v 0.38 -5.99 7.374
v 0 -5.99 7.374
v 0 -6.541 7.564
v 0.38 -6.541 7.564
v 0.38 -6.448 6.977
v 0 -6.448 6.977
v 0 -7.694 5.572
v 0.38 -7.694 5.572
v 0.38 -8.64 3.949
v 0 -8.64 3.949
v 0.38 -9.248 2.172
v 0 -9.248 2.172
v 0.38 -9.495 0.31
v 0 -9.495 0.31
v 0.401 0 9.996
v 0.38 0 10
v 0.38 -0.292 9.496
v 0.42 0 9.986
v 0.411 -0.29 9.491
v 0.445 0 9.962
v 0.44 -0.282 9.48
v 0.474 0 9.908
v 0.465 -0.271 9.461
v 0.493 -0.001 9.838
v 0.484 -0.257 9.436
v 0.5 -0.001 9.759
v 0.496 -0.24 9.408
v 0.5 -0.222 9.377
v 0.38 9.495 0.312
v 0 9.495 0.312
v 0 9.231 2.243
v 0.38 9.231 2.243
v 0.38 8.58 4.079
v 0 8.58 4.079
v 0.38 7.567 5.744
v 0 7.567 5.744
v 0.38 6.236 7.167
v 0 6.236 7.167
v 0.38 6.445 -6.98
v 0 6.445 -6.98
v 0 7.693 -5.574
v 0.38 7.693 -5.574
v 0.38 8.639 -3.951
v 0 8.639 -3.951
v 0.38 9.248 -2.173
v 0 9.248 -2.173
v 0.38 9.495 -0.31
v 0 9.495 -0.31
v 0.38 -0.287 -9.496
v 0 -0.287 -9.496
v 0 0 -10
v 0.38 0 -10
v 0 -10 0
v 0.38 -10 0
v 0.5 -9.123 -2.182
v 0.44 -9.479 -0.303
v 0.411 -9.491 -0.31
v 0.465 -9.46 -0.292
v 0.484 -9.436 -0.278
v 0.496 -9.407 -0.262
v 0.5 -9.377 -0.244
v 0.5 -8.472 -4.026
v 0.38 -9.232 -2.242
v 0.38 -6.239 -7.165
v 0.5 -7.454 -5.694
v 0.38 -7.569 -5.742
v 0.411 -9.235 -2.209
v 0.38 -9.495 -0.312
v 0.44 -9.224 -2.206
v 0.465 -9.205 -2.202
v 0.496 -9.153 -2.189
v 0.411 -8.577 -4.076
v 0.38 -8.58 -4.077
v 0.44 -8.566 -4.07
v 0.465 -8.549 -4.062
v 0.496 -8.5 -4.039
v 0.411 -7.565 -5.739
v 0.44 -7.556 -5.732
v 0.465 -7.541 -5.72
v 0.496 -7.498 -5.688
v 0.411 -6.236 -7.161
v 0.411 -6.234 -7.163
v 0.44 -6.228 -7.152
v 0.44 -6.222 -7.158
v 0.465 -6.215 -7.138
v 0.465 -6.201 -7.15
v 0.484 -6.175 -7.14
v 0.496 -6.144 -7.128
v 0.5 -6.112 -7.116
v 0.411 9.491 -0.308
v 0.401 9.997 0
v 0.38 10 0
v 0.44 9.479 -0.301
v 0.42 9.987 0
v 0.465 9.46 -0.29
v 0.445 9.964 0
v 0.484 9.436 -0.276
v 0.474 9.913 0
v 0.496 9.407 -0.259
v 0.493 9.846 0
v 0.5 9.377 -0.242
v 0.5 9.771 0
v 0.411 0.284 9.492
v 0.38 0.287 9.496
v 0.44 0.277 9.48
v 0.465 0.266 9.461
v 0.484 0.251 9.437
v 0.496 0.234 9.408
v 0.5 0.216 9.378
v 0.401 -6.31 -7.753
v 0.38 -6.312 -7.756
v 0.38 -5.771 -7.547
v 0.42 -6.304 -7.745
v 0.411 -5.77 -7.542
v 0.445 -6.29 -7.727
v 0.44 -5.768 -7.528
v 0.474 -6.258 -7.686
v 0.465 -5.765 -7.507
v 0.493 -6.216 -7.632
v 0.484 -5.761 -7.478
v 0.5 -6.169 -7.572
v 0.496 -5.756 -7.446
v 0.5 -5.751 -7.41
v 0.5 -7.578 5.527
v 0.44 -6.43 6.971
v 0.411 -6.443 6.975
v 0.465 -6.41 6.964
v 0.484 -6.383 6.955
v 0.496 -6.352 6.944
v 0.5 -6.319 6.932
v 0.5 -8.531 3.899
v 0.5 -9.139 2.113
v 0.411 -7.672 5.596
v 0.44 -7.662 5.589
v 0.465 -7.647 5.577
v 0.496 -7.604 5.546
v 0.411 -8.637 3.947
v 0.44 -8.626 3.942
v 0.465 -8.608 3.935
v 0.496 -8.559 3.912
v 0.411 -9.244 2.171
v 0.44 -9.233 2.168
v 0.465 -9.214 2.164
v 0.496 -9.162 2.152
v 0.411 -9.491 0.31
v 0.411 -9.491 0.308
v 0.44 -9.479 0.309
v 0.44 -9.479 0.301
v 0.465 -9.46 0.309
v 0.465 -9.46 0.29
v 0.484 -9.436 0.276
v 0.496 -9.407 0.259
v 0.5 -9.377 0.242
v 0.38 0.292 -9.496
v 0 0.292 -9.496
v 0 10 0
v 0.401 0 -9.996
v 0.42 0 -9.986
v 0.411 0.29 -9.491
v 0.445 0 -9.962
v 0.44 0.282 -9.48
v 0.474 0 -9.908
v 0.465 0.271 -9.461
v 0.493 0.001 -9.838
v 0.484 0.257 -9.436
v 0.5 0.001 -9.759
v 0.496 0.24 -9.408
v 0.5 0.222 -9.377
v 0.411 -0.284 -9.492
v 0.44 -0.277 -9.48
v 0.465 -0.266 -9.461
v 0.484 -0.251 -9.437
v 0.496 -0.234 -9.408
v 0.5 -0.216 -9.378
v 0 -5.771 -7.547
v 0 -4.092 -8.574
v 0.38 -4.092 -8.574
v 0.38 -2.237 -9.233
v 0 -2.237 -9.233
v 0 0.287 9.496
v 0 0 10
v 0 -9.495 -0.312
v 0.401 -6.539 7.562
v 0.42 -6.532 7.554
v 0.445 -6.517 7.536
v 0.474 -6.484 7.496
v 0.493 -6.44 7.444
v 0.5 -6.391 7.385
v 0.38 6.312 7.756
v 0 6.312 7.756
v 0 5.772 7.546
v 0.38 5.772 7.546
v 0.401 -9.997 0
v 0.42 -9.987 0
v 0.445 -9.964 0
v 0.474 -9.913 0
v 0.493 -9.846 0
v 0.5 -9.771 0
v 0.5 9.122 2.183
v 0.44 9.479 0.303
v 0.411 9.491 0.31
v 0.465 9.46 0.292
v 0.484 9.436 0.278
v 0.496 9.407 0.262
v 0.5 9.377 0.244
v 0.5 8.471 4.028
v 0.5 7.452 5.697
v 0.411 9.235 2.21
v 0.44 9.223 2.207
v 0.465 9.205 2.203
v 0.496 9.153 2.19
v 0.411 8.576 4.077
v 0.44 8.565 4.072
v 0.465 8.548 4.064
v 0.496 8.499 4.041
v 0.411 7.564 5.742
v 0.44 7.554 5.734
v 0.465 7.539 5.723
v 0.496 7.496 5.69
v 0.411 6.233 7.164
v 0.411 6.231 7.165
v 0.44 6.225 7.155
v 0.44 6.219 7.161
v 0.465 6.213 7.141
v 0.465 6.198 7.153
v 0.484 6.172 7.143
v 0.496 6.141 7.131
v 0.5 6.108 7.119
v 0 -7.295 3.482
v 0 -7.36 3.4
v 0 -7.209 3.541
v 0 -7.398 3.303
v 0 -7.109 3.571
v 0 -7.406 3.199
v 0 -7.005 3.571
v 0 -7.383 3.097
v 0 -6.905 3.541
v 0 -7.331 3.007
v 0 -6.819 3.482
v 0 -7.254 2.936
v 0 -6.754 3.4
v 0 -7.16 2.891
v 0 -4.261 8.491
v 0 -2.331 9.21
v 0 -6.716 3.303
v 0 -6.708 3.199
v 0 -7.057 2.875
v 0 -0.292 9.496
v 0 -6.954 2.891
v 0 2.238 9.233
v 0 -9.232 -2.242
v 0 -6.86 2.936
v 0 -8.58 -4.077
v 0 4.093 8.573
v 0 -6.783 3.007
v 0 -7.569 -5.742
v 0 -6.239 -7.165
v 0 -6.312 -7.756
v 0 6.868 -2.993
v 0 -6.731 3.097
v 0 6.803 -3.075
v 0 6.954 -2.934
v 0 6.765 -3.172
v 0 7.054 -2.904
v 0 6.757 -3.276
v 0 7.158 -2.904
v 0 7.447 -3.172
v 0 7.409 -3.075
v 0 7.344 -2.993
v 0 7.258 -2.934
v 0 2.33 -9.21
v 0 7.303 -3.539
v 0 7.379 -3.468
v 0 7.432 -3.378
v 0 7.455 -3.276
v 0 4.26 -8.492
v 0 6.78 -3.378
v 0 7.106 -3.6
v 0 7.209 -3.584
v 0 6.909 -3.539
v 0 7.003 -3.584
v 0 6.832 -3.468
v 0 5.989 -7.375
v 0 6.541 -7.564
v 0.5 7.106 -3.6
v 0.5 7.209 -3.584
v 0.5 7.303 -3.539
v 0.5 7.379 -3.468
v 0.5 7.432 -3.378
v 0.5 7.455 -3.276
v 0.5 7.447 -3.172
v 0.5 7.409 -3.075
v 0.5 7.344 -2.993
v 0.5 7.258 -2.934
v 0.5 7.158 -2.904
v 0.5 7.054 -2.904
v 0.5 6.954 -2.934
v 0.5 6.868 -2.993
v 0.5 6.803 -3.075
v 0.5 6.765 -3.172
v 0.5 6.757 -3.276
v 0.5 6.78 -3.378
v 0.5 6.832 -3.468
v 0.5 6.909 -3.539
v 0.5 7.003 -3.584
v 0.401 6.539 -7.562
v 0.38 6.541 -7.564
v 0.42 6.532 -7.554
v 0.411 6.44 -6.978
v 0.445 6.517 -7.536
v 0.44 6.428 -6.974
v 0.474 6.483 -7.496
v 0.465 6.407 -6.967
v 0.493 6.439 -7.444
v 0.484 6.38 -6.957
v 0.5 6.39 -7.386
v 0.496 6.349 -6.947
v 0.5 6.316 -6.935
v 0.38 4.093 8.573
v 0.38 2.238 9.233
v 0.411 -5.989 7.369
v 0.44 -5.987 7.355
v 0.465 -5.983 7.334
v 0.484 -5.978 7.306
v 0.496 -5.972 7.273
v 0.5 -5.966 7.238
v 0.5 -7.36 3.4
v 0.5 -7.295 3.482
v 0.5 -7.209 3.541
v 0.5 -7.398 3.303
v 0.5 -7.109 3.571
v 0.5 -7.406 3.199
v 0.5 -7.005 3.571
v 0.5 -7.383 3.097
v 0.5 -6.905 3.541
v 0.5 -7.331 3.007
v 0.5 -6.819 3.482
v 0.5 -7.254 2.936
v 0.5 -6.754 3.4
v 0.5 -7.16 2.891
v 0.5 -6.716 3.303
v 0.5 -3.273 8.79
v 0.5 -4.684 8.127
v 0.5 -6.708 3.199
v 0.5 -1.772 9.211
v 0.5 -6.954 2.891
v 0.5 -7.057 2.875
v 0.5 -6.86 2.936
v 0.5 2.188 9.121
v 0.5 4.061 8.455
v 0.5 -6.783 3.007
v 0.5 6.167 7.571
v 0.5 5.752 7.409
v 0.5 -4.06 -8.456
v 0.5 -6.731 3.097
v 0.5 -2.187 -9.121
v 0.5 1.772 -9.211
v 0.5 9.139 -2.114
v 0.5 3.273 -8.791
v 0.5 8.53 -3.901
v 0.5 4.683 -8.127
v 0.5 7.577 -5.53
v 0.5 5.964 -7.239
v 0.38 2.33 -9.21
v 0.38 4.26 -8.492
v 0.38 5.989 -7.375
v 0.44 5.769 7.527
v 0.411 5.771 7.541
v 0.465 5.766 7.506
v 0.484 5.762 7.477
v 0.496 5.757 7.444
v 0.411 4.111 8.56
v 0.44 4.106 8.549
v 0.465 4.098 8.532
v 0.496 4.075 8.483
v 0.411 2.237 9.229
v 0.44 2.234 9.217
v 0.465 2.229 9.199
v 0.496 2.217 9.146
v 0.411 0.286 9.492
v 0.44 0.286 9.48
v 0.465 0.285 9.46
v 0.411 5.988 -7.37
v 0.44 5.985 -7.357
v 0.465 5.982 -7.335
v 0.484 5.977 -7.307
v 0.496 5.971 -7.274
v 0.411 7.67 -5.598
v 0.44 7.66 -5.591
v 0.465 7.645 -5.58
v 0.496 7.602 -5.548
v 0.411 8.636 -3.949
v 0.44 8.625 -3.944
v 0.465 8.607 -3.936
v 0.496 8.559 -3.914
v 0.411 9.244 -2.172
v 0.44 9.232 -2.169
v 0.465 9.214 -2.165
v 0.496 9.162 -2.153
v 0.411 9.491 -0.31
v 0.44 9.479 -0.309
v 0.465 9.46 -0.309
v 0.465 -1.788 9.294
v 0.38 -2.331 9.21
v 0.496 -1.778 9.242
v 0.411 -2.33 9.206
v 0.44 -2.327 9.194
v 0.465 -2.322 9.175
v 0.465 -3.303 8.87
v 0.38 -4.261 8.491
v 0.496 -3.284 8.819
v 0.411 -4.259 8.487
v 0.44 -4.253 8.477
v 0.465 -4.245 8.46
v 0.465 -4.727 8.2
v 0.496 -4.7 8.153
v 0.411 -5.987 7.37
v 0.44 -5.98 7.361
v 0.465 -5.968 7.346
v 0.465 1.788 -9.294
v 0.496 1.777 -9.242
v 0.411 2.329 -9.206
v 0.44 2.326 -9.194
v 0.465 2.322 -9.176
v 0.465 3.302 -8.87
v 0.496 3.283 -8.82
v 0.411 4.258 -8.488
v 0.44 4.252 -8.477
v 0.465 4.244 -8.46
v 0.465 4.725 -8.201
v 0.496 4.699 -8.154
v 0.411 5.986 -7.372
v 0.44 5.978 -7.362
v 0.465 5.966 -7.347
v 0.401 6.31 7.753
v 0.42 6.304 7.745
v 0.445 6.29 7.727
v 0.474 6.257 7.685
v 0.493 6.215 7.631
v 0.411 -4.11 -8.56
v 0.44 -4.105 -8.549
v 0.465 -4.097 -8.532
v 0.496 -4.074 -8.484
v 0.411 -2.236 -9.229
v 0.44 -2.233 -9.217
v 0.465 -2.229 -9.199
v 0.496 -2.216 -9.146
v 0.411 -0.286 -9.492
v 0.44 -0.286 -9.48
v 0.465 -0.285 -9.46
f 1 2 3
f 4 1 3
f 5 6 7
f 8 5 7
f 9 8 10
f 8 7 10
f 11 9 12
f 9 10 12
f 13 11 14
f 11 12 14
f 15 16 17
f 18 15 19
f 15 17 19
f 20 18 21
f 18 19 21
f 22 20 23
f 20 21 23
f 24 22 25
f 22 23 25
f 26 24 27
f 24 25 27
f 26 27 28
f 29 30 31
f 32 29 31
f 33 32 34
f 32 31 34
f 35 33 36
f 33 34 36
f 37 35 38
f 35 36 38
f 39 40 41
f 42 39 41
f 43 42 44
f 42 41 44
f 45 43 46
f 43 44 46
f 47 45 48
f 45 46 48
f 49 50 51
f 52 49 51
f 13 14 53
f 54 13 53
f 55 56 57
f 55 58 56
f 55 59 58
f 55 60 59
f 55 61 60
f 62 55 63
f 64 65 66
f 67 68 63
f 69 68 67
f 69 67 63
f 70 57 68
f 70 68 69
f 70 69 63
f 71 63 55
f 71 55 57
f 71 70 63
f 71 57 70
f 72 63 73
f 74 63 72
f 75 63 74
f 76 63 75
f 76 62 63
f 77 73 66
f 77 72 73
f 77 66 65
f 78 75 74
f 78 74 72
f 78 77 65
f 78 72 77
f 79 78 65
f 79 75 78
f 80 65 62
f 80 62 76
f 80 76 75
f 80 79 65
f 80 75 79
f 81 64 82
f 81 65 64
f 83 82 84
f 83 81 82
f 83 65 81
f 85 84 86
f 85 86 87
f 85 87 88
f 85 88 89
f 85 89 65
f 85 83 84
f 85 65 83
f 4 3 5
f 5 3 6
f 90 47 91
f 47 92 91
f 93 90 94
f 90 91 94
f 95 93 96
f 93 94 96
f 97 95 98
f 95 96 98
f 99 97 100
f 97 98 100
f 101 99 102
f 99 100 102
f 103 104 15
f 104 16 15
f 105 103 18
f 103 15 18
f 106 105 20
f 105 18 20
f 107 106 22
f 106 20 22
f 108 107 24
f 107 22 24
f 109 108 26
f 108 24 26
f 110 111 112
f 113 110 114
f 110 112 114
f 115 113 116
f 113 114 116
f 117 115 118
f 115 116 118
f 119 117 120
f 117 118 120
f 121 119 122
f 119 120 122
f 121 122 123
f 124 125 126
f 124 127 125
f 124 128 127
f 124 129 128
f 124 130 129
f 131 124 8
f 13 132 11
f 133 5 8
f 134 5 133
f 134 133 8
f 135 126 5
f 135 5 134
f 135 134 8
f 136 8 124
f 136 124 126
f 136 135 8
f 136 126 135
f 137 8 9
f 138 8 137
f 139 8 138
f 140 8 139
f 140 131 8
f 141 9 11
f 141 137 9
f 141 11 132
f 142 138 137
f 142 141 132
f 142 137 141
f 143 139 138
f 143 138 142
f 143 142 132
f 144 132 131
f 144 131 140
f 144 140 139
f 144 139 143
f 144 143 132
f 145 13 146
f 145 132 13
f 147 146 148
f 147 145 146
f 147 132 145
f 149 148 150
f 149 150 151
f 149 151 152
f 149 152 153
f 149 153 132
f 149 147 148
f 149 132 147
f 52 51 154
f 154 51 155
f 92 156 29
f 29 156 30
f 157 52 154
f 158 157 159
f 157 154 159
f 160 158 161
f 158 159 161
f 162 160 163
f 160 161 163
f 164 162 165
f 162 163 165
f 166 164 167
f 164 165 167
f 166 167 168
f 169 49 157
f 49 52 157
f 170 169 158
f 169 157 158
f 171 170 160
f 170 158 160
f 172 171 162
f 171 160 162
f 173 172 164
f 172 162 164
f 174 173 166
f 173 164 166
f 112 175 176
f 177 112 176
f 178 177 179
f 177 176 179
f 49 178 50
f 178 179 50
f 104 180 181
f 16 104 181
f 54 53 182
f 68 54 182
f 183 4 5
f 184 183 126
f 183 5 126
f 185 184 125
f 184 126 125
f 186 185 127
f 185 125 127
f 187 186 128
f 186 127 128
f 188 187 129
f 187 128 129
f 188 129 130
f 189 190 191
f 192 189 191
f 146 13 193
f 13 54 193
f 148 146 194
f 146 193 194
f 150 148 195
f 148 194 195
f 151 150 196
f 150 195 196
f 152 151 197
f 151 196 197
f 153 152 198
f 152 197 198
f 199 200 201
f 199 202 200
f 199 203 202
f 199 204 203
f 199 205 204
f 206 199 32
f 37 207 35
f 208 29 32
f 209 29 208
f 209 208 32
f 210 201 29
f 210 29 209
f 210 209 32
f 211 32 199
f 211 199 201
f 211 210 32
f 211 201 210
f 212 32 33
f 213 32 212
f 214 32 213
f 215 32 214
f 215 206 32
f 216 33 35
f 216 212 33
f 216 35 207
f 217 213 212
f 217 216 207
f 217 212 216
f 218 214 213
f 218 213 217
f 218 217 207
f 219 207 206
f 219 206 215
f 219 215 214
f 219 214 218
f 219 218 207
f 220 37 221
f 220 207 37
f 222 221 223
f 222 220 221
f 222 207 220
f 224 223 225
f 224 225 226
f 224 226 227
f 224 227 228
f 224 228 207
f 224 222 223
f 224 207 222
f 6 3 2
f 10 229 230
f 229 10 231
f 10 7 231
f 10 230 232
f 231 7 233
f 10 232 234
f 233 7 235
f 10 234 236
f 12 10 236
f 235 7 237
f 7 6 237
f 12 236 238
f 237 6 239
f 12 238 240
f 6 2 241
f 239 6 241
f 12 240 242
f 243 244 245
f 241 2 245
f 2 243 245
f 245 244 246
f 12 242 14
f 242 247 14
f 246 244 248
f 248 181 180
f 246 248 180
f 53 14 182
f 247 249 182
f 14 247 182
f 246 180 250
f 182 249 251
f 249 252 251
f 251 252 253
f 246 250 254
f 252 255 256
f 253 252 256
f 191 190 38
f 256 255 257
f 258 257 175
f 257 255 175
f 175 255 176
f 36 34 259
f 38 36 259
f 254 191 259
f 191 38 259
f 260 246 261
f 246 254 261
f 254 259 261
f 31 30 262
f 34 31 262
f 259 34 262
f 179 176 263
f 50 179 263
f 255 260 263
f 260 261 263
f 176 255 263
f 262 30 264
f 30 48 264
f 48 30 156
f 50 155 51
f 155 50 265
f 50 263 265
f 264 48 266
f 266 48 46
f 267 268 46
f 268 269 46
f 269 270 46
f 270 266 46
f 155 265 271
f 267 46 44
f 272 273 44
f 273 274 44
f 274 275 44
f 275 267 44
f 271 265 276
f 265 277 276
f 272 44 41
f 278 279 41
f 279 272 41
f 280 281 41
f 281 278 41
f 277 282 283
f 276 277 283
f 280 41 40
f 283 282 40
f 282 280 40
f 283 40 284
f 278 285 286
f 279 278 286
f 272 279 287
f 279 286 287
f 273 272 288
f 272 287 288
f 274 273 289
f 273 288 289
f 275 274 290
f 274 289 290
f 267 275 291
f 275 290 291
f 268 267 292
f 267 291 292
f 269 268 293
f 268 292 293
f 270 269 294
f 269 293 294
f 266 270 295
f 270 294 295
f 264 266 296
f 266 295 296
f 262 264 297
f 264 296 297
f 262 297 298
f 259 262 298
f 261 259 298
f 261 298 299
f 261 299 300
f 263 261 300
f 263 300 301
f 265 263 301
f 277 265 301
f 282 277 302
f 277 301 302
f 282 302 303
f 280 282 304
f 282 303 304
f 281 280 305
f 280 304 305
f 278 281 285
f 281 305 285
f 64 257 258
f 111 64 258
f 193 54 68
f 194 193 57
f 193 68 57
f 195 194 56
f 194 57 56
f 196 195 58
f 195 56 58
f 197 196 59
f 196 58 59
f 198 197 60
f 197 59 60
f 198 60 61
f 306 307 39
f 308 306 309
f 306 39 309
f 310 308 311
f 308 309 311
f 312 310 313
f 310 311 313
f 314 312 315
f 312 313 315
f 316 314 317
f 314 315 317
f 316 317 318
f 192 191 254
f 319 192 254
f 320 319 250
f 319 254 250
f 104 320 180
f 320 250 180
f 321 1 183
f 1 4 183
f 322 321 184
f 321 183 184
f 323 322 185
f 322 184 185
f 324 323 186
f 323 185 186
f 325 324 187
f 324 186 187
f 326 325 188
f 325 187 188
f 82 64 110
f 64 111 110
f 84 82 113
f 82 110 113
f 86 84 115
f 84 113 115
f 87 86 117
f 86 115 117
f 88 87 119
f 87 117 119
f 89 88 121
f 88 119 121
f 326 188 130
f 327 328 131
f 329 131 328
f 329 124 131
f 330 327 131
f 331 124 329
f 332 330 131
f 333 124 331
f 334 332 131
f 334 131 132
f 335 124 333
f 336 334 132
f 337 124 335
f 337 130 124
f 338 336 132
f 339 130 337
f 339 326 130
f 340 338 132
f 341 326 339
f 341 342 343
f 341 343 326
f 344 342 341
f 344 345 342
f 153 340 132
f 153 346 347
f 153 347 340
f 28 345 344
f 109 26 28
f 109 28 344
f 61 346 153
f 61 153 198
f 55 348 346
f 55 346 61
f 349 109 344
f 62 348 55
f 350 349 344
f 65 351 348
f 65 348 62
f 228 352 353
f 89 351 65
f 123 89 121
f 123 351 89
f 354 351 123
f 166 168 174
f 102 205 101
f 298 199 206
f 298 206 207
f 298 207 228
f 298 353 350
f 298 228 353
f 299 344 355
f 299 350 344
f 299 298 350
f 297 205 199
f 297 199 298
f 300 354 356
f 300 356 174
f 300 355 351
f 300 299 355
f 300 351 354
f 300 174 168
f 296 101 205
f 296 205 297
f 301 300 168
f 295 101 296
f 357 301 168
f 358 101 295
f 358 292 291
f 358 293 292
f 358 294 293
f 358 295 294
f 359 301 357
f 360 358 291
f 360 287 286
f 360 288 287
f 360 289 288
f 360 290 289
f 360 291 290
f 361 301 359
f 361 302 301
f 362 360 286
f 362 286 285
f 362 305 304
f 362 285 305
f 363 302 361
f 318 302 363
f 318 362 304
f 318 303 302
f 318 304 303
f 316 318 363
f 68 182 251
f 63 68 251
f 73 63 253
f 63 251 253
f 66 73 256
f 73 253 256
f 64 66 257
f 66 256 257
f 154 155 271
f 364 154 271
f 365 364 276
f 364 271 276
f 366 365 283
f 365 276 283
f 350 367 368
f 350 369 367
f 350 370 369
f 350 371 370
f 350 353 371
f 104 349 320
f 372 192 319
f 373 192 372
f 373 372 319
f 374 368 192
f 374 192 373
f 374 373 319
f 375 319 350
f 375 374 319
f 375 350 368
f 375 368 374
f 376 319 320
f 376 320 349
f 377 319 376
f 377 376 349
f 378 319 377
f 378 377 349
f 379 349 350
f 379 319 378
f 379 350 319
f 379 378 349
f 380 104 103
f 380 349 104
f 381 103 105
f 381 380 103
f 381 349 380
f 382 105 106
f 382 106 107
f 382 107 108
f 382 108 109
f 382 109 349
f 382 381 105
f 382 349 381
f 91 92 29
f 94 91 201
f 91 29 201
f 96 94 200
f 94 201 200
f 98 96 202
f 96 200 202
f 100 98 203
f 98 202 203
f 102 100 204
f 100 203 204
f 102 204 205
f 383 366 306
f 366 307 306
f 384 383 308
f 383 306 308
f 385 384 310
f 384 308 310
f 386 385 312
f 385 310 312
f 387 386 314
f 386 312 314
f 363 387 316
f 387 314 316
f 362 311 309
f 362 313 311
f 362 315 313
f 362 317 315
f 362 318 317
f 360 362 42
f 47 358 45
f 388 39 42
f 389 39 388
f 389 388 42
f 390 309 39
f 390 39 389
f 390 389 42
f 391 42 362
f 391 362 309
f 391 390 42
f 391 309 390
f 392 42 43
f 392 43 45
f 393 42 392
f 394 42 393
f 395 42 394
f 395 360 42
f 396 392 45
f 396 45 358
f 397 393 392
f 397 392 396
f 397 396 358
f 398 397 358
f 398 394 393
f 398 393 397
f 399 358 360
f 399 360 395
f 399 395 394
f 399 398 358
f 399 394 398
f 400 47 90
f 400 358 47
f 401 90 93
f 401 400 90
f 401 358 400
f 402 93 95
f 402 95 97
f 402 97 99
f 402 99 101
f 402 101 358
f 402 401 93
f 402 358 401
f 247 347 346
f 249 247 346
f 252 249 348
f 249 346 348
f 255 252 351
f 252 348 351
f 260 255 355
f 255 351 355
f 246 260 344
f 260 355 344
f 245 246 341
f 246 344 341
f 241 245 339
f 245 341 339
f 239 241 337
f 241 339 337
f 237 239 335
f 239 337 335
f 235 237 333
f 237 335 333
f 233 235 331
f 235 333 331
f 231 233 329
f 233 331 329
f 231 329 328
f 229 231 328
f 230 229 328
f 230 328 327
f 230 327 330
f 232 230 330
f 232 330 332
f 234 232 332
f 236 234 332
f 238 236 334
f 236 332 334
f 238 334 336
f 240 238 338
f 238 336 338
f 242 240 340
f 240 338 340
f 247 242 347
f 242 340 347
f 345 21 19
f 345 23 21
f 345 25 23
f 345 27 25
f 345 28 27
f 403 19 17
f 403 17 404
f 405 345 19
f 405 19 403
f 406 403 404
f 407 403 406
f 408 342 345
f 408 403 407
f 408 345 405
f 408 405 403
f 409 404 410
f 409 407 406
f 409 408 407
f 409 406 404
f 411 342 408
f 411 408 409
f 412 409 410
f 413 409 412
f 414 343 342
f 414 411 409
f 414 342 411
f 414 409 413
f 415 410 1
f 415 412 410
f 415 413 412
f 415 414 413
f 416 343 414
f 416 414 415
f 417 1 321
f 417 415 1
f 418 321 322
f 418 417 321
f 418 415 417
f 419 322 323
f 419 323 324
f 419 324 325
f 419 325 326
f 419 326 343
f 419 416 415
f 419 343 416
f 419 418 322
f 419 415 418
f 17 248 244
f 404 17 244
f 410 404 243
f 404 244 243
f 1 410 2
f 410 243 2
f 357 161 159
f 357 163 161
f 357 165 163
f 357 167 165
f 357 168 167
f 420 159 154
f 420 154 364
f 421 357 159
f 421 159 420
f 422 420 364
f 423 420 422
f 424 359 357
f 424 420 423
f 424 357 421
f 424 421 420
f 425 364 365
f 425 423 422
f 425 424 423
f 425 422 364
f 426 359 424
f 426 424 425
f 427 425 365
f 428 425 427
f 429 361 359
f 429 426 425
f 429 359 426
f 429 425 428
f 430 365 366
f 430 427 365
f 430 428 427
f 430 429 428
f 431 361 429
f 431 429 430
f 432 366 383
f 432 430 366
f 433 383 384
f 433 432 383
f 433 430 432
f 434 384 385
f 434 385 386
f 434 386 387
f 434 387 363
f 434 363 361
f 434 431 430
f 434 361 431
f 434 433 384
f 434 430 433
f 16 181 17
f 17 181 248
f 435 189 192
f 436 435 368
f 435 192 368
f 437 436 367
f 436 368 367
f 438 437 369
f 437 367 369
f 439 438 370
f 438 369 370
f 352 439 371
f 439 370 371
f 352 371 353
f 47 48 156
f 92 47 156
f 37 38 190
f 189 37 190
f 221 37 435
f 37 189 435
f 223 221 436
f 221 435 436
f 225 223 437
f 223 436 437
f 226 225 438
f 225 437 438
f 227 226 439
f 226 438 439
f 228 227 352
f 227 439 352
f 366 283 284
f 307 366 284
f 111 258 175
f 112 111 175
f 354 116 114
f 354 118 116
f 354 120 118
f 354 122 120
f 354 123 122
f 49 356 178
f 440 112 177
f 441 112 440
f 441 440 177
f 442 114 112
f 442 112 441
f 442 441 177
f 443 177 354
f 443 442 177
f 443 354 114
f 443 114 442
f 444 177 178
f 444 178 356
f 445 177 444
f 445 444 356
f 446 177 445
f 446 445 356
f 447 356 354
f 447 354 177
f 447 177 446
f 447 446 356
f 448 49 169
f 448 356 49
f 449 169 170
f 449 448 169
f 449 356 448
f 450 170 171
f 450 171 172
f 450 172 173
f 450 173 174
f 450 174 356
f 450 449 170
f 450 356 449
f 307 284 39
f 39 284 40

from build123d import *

# Parameters (mm, degrees)
RESSALTO_EXTRUS_O1_DEPTH = 0.5
FILETE2_R                = 0.12
ESBO_O3_R                = 0.35
CORTE_EXTRUS_O1_DEPTH    = 0.5


with BuildPart() as part:
    # Esboço1 → Ressalto-extrusão1 (new body)
    with BuildSketch(Plane(origin=(0, 0, 0), x_dir=(0, 0, -1), z_dir=(1, 0, 0))):
        with BuildLine():
            Line((7.755818376, -6.312470303), (7.546549647, -5.770579557))
            ThreePointArc((7.546549647, -5.770579557), (8.951430844, -3.181491135), (9.495678331, -0.286518819))
            Line((9.495678331, -0.286518819), (10, 0))
            Line((10, 0), (9.495513044, 0.291945241))
            ThreePointArc((9.495513044, 0.291945241), (8.903037488, 3.314501996), (7.374694694, 5.988645771))
            Line((7.374694694, 5.988645771), (7.564299357, 6.540747299))
            Line((7.564299357, 6.540747299), (6.979531804, 6.444853435))
            ThreePointArc((6.979531804, 6.444853435), (3.95093379, 8.639451498), (0.30994469, 9.494942564))
            Line((0.30994469, 9.494942564), (0, 10))
            Line((0, 10), (-0.312056411, 9.494873395))
            ThreePointArc((-0.312056411, 9.494873395), (-4.079212885, 8.579628328), (-7.167066673, 6.235635918))
            Line((-7.167066673, 6.235635918), (-7.755818376, 6.312470303))
            Line((-7.755818376, 6.312470303), (-7.545539803, 5.771899955))
            ThreePointArc((-7.545539803, 5.771899955), (-8.951152463, 3.182274278), (-9.495678331, 0.286518819))
            Line((-9.495678331, 0.286518819), (-10, 0))
            Line((-10, 0), (-9.495513044, -0.291945241))
            ThreePointArc((-9.495513044, -0.291945241), (-8.902746815, -3.315282665), (-7.373644327, -5.98993901))
            Line((-7.373644327, -5.98993901), (-7.564299357, -6.540747299))
            Line((-7.564299357, -6.540747299), (-6.976885209, -6.447718417))
            ThreePointArc((-6.976885209, -6.447718417), (-3.949160195, -8.640262366), (-0.30994469, -9.494942564))
            Line((-0.30994469, -9.494942564), (0, -10))
            Line((0, -10), (0.312056411, -9.494873395))
            ThreePointArc((0.312056411, -9.494873395), (4.077471711, -8.580455958), (7.16453525, -6.238544273))
            Line((7.16453525, -6.238544273), (7.755818376, -6.312470303))
        make_face()
    extrude(amount=RESSALTO_EXTRUS_O1_DEPTH)

    # Filete2
    filete2_edges = [part.edges().sort_by_distance(p)[0] for p in [
        (0.5, -0.14325941, -9.747839166),
        (0.5, 0.145972621, -9.747756522),
        (0.5, 3.314501996, -8.903037488),
        (0.5, 6.264696535, -7.469497026),
        (0.5, 6.492800367, -7.271915581),
        (0.5, 8.639451498, -3.95093379),
        (0.5, 9.747471282, -0.154972345),
        (0.5, 9.747436698, 0.156028205),
        (0.5, 8.579628328, 4.079212885),
        (0.5, 6.274053111, 7.461442524),
        (0.5, -6.04152493, -7.651184011),
        (0.5, 6.042185129, 7.650679089),
        (0.5, 3.182274278, 8.951152463),
        (0.5, 0.14325941, 9.747839166),
        (0.5, -0.145972621, 9.747756522),
        (0.5, -3.315282665, 8.902746815),
        (0.5, -6.265343155, 7.468971842),
        (0.5, -6.494232858, 7.270592283),
        (0.5, -8.640262366, 3.949160195),
        (0.5, -9.747471282, 0.154972345),
        (0.5, -3.181491135, -8.951430844),
        (0.5, -9.747436698, -0.156028205),
        (0.5, -8.580455958, -4.077471711),
        (0.5, -6.275507288, -7.460176813),
    ]]
    fillet(filete2_edges, radius=FILETE2_R)

    # Esboço3 → Corte-extrusão1 (cut)
    with BuildSketch(Plane(origin=(0.5, 0, 0), x_dir=(0, 0, -1), z_dir=(1, 0, 0))):
        with Locations((3.249745018, 7.105782814)):
            Circle(ESBO_O3_R)
        with Locations((-3.225311319, -7.056999805)):
            Circle(ESBO_O3_R)
    extrude(amount=-CORTE_EXTRUS_O1_DEPTH, mode=Mode.SUBTRACT)


solid = part.part
